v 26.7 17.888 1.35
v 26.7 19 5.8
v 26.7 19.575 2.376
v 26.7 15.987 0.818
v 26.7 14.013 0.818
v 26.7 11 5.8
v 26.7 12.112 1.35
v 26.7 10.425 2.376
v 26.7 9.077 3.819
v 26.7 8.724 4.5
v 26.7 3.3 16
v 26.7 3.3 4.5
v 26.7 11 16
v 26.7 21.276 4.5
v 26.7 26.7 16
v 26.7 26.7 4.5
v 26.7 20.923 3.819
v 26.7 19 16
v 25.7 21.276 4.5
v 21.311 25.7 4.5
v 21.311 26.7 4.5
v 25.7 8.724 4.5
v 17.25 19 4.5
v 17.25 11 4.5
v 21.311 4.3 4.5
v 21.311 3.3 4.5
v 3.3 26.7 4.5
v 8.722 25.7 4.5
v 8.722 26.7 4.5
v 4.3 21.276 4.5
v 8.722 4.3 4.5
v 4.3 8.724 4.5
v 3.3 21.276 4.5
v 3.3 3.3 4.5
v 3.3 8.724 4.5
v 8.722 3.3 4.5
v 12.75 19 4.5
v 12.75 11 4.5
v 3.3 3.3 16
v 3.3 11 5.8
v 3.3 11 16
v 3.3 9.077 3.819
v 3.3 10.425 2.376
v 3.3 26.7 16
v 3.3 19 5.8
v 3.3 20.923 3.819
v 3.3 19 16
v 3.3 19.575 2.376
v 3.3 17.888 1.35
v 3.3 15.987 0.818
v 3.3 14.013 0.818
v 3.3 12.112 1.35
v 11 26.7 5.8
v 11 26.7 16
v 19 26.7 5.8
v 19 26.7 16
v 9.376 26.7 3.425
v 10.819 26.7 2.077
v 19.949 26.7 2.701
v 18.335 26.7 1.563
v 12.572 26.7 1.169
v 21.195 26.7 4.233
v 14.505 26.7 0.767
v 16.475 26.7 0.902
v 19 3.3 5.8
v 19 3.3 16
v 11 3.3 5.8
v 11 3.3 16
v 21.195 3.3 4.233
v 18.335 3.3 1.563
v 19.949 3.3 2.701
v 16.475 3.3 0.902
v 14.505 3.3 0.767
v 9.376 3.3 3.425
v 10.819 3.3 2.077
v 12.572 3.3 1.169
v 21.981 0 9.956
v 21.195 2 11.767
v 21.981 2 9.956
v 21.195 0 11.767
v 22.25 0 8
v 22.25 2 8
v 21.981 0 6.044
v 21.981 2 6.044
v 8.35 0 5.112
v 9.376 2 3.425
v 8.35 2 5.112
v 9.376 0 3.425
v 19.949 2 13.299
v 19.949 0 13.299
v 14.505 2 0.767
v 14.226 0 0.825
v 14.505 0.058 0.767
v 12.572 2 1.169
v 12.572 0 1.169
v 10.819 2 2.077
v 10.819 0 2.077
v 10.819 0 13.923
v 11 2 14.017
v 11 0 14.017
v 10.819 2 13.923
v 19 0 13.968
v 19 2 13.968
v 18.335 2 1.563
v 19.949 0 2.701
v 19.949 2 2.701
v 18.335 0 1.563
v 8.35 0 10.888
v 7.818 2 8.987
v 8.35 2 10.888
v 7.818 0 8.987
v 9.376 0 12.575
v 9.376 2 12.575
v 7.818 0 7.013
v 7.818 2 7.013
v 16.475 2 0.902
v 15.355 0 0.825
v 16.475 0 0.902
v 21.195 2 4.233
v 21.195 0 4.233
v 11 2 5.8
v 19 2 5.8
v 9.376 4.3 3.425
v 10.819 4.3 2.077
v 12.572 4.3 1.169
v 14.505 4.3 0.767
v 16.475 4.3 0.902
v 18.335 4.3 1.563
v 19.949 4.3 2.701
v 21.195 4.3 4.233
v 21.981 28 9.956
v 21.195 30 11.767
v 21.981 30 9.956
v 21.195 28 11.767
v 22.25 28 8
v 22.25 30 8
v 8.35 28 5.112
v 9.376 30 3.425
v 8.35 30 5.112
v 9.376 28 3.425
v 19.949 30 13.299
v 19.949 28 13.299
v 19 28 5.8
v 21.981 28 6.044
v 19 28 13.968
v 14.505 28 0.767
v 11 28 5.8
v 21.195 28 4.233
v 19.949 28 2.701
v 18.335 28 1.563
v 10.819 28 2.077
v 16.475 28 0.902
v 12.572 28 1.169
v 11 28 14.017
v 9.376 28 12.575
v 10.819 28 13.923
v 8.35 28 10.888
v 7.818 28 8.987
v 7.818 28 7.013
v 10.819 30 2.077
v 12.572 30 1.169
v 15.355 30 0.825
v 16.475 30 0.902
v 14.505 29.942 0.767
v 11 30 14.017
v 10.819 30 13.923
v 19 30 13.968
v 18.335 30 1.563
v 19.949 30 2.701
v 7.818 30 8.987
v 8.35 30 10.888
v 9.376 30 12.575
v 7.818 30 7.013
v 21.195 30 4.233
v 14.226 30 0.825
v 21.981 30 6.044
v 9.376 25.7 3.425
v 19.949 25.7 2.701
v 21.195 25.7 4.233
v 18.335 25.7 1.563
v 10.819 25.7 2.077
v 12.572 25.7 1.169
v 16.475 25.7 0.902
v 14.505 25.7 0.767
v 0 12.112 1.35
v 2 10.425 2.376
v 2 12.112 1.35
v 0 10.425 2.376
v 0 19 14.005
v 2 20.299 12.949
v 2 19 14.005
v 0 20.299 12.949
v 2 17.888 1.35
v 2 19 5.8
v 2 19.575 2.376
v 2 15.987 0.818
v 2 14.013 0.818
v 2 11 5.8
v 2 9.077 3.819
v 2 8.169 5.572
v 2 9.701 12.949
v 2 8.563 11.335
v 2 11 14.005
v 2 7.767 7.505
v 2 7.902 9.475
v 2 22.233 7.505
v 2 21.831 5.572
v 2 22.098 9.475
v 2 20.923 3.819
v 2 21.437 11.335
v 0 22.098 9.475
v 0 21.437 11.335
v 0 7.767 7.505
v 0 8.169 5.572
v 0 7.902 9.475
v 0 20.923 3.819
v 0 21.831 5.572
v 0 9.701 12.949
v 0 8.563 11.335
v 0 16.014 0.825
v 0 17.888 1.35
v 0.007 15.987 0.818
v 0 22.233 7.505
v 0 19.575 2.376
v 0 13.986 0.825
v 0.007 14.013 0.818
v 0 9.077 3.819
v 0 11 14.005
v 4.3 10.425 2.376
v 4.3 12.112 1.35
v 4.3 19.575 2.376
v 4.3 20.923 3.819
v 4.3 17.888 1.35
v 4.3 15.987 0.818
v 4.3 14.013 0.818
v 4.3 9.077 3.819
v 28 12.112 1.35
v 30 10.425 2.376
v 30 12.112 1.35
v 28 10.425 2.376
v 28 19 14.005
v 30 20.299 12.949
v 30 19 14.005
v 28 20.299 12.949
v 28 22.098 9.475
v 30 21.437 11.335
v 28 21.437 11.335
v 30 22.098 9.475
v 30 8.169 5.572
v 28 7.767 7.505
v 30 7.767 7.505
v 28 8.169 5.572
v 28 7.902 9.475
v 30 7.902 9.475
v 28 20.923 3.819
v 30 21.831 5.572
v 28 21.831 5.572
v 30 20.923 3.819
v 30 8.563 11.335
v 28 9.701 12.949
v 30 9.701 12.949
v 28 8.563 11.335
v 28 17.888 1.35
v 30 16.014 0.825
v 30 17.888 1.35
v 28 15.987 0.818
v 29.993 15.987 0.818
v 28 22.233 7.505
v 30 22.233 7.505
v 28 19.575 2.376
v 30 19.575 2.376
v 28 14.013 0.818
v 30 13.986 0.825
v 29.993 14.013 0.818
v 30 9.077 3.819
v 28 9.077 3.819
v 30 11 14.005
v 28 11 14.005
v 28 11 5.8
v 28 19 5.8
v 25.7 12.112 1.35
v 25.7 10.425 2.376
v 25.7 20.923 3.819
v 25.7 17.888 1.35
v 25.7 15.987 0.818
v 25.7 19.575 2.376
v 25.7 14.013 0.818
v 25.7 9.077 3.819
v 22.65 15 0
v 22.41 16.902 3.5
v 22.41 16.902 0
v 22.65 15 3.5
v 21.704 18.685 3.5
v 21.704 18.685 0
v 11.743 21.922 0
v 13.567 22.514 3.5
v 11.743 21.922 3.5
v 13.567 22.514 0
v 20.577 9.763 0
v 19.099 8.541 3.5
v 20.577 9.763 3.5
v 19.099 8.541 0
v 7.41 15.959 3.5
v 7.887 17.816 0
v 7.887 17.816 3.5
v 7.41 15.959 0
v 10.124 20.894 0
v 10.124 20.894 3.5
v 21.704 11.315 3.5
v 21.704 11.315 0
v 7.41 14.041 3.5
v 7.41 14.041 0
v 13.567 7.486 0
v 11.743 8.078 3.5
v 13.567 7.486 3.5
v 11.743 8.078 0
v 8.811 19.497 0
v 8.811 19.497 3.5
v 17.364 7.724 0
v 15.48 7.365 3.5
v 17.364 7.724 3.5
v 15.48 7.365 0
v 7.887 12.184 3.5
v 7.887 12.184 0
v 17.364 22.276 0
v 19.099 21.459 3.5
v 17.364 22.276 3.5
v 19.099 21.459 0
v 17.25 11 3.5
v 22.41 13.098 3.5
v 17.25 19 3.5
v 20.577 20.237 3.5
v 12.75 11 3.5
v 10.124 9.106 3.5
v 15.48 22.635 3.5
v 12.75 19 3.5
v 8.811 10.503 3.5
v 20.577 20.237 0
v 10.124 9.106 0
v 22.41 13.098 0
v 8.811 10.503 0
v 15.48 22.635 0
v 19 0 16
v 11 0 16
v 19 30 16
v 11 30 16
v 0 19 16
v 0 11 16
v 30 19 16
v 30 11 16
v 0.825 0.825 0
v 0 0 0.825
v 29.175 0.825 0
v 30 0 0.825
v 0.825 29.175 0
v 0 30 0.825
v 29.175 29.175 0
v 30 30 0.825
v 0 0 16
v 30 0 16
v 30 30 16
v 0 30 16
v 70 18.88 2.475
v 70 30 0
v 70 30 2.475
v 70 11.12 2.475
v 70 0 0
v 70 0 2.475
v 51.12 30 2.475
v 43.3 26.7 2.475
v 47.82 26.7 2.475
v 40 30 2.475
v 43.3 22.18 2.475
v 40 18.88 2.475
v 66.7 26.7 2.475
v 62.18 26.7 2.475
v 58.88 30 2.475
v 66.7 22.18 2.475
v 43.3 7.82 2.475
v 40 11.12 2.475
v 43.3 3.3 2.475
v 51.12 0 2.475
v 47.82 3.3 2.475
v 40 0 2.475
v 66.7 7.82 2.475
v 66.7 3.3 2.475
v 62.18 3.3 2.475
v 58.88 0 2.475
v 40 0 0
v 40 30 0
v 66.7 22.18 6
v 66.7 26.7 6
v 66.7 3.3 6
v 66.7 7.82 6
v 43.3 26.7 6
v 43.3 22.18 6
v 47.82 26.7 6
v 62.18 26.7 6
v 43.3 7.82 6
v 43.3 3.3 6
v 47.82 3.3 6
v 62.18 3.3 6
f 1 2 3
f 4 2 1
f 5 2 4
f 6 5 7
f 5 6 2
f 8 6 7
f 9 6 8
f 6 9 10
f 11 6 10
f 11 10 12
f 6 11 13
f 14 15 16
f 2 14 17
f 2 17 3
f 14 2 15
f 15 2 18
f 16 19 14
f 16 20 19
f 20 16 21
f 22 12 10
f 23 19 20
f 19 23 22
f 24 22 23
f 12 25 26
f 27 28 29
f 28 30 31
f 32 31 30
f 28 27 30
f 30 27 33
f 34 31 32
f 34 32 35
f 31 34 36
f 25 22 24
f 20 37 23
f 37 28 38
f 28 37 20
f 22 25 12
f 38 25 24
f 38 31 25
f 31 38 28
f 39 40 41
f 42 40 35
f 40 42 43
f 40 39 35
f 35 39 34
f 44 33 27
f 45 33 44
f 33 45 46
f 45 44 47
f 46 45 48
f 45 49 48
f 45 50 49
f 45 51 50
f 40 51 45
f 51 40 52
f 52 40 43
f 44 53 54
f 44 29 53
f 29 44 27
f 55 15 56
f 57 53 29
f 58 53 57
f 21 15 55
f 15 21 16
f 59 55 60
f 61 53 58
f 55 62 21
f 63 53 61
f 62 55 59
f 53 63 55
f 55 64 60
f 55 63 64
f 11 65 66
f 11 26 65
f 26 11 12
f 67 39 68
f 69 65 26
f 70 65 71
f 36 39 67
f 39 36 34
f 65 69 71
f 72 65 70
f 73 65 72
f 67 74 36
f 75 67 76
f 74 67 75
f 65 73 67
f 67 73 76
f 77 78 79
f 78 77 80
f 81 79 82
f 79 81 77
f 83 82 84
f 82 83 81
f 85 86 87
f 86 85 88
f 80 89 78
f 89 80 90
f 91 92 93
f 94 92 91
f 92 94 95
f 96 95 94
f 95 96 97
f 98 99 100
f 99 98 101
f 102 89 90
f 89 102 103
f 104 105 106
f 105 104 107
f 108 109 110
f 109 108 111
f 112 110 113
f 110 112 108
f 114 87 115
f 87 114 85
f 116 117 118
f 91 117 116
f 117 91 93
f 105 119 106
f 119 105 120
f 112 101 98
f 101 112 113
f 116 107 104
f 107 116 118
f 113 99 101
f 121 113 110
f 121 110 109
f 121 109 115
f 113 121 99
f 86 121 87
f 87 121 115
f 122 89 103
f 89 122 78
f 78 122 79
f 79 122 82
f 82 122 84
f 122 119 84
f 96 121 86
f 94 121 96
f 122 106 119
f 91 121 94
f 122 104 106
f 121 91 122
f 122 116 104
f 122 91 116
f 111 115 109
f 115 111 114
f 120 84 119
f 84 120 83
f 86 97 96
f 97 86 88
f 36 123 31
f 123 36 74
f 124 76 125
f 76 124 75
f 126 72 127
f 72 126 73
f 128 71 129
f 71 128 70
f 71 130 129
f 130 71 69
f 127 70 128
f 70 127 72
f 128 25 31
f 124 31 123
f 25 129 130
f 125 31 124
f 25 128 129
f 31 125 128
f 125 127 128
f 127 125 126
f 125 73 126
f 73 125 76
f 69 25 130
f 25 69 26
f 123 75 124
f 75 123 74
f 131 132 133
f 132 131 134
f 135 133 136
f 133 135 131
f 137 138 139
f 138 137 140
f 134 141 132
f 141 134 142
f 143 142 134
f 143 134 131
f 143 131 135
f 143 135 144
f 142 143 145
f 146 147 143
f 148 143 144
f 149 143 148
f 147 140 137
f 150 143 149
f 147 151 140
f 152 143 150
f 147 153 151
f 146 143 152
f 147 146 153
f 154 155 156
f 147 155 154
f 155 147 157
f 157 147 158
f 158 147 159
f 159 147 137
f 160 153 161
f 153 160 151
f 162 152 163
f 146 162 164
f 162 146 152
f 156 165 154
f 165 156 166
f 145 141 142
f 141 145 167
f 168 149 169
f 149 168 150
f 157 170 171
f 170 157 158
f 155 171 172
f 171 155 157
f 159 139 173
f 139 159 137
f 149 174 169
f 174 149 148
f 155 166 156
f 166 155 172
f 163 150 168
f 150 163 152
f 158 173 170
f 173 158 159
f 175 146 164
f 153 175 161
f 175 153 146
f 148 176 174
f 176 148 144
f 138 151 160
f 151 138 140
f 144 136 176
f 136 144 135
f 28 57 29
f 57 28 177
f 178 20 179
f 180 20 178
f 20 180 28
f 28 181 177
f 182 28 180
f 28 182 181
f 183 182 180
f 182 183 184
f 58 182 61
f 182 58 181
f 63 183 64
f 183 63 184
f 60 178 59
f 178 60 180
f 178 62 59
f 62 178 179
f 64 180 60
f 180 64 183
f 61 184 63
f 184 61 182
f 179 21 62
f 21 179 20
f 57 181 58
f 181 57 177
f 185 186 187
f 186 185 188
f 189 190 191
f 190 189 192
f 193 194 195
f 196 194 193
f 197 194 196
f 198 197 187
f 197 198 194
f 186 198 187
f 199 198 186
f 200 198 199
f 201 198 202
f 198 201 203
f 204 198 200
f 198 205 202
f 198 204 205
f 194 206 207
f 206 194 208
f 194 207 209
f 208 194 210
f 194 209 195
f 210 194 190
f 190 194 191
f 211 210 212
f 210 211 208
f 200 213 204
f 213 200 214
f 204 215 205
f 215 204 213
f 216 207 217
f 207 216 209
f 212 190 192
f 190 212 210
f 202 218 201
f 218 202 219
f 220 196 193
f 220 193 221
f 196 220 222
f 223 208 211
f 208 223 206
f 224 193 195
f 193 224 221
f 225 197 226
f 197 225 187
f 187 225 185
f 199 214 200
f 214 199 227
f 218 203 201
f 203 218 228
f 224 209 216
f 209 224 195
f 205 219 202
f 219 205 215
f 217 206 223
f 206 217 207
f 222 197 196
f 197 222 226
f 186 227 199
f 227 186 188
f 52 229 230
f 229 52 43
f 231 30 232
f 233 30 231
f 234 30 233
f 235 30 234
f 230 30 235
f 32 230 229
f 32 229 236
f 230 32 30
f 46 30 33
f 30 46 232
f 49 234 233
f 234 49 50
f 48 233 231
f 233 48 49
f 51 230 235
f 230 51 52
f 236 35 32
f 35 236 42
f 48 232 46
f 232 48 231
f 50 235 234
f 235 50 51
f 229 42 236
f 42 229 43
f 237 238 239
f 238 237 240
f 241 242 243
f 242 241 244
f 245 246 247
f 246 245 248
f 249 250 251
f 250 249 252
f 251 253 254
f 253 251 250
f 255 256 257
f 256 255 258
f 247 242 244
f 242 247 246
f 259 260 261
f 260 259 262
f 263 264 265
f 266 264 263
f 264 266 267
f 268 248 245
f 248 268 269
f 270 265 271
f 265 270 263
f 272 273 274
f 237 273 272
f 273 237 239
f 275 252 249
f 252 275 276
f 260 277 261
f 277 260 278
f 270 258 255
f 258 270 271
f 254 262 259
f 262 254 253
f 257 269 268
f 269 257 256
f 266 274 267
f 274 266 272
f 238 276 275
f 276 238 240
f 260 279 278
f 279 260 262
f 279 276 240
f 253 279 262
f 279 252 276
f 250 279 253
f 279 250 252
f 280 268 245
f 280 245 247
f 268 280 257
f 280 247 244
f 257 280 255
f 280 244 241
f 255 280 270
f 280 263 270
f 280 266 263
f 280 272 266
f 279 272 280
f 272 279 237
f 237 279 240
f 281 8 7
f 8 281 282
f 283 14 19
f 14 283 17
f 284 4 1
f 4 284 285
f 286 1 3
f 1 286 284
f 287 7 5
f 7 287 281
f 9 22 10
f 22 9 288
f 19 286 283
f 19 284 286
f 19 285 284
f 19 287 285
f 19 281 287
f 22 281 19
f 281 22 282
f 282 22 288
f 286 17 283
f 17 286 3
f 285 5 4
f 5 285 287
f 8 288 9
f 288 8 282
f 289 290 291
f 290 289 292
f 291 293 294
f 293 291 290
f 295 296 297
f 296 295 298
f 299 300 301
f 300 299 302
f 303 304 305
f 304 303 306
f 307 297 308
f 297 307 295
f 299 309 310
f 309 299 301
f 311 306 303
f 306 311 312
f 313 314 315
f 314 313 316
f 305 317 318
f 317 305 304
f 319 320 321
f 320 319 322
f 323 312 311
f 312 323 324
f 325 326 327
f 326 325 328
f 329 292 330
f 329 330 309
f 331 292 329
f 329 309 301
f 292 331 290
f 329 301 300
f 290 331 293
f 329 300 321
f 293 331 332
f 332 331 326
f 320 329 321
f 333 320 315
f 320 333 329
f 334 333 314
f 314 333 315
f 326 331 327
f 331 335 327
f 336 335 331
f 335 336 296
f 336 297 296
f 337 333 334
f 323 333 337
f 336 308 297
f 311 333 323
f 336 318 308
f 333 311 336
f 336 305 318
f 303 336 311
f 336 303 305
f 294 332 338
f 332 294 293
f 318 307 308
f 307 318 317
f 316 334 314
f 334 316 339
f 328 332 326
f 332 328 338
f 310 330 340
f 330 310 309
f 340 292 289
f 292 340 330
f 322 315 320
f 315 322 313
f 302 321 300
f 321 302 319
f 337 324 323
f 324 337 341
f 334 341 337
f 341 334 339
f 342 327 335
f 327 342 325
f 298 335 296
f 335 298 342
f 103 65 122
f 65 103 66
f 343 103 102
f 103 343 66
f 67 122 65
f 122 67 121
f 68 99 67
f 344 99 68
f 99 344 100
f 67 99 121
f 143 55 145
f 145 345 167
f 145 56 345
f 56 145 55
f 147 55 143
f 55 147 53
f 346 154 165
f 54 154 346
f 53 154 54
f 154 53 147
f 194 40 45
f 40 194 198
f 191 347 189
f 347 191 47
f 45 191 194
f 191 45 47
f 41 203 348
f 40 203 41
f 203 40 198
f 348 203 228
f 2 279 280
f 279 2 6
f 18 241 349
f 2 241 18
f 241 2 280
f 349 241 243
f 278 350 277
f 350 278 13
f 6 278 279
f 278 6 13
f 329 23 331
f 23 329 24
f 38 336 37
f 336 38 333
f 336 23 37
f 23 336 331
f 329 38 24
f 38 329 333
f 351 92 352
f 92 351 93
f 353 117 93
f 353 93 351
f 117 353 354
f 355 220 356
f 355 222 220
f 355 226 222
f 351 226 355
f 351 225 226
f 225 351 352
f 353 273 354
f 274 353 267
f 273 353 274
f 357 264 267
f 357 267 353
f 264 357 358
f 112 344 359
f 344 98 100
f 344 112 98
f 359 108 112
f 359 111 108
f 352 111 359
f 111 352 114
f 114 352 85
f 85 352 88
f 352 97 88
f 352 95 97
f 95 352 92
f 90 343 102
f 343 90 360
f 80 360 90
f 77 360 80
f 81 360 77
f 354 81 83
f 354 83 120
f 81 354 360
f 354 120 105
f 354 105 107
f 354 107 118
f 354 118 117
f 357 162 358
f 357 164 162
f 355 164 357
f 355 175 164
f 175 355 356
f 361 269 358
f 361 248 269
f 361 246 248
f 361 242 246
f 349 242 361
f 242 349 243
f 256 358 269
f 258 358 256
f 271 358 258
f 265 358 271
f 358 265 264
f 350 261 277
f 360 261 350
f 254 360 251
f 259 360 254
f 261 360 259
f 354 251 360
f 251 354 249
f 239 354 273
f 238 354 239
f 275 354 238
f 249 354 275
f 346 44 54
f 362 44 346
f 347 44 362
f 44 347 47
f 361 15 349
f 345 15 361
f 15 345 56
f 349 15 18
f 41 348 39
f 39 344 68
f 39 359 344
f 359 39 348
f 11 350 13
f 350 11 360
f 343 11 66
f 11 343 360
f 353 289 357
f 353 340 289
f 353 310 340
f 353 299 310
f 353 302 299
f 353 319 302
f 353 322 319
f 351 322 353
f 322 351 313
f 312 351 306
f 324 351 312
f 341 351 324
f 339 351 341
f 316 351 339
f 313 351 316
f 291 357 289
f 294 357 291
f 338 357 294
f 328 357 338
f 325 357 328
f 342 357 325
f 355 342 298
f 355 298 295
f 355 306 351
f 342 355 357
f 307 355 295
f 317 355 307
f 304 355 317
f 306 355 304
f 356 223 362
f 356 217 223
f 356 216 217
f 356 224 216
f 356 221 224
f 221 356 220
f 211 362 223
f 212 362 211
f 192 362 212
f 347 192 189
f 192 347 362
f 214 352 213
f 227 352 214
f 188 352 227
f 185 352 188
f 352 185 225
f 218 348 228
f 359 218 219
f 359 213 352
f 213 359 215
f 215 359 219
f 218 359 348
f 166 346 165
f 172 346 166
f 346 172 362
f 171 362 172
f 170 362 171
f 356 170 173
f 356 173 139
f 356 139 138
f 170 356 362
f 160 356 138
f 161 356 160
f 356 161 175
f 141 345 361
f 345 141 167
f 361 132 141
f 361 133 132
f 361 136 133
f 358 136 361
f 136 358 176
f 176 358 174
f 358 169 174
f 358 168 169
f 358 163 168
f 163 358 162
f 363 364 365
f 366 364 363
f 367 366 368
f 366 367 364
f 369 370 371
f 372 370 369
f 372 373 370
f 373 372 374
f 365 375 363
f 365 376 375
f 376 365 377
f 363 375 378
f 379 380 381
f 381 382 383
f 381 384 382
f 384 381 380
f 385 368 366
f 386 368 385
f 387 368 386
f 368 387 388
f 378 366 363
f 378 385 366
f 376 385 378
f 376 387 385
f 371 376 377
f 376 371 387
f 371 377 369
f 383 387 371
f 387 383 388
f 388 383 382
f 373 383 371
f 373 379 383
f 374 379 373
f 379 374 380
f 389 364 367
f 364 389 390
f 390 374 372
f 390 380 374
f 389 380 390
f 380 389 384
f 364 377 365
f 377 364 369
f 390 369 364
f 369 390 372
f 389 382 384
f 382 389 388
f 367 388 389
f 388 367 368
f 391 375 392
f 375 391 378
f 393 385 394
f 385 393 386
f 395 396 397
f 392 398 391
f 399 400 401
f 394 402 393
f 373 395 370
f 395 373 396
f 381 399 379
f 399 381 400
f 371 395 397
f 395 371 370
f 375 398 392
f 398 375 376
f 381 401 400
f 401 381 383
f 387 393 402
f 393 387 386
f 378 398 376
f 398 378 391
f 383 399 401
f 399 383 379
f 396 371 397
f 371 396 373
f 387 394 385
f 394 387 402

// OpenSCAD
module cap_1x1(width, height, thickness)
{
    width1=width-thickness;
    difference()
    {
        union()
        {
            cube([width, width, thickness*3/4]);
            translate([thickness,thickness,0])cube([width-2*thickness, width-2*thickness, height]);
        }
        translate([width/2,width/2,0])rotate([0,0,45])translate([-width1/2,-width1/2,thickness*3/4]) cube([width1,width1,height]);
    }
}

module radio_cube_1x1(width, height, thickness)
{
    difference()
    {
        cube([width,width,height]);
        union()
        {
            translate([thickness,thickness,thickness+1.2]) cube([width-2*thickness,width-2*thickness,height+10]);
            
            //-y
            translate([width/2,2.0,8])rotate([90,0,0])cylinder(r=14.5/2, h=2.6);
            translate([width/2,thickness+1,8])rotate([90,0,0])cylinder(r=14.5/2, h=1);
            
            // y
            translate([width/2,width+0.6,8])rotate([90,0,0])cylinder(r=14.5/2, h=2.6);
            translate([width/2,width-thickness,8])rotate([90,0,0])cylinder(r=14.5/2, h=1);
            
            //-x
            translate([2.0,width/2,8])rotate([0,-90,0])cylinder(r=14.5/2, h=2.6);
            translate([thickness+1,width/2,8])rotate([0,-90,0])cylinder(r=14.5/2, h=1);
            
            // x
            translate([width+0.6,width/2,8])rotate([0,-90,0])cylinder(r=14.5/2, h=2.6);
            translate([width-thickness,width/2,8])rotate([0,-90,0])cylinder(r=14.5/2, h=1);

            //bottom
            translate([width/2,width/2,-0.1]) cylinder(r=15.3/2, h=3.6);
            
            //cutouts
            // -y
            translate([width/2-4,-0.2,5.8])cube([8,20,15]);
            // y
            translate([width/2-4, width-10,5.8])cube([8,20,15]);
            // -x
            translate([-0.2,width/2-4,5.8])cube([20,8,15]);
            // x
            translate([width-10,width/2-4,5.8])cube([20,8,15]);
            // bottom
            translate([width/2-2.25,width/2-4,0])cube([4.5,8,15]);
            
            //corners
            translate([0,0.25*thickness,0])rotate([45,0,0]) translate([-0.5*width, -width, -0.5*height]) cube([2*width, width, 2*height]);
            translate([0.25*thickness,0,0]) rotate([0,-45,0]) translate([-width, -0.5*width, -0.5*height]) cube([width, 2*width, 2*height]);
            translate([width-0.25*thickness,0,0]) rotate([0,45,0]) translate([0, 0, -0.5*height]) cube([width, 2*width, 2*height]);
            translate([0,width-0.25*thickness,0]) rotate([-45,0,0]) translate([-0.5*width, 0, -0.5*height]) cube([2*width, width, 2*height]);
        }
    }
}

radio_cube_1x1(30, 16, 3.3);

translate([40, 0, 0]) cap_1x1(30,6,3.3);
